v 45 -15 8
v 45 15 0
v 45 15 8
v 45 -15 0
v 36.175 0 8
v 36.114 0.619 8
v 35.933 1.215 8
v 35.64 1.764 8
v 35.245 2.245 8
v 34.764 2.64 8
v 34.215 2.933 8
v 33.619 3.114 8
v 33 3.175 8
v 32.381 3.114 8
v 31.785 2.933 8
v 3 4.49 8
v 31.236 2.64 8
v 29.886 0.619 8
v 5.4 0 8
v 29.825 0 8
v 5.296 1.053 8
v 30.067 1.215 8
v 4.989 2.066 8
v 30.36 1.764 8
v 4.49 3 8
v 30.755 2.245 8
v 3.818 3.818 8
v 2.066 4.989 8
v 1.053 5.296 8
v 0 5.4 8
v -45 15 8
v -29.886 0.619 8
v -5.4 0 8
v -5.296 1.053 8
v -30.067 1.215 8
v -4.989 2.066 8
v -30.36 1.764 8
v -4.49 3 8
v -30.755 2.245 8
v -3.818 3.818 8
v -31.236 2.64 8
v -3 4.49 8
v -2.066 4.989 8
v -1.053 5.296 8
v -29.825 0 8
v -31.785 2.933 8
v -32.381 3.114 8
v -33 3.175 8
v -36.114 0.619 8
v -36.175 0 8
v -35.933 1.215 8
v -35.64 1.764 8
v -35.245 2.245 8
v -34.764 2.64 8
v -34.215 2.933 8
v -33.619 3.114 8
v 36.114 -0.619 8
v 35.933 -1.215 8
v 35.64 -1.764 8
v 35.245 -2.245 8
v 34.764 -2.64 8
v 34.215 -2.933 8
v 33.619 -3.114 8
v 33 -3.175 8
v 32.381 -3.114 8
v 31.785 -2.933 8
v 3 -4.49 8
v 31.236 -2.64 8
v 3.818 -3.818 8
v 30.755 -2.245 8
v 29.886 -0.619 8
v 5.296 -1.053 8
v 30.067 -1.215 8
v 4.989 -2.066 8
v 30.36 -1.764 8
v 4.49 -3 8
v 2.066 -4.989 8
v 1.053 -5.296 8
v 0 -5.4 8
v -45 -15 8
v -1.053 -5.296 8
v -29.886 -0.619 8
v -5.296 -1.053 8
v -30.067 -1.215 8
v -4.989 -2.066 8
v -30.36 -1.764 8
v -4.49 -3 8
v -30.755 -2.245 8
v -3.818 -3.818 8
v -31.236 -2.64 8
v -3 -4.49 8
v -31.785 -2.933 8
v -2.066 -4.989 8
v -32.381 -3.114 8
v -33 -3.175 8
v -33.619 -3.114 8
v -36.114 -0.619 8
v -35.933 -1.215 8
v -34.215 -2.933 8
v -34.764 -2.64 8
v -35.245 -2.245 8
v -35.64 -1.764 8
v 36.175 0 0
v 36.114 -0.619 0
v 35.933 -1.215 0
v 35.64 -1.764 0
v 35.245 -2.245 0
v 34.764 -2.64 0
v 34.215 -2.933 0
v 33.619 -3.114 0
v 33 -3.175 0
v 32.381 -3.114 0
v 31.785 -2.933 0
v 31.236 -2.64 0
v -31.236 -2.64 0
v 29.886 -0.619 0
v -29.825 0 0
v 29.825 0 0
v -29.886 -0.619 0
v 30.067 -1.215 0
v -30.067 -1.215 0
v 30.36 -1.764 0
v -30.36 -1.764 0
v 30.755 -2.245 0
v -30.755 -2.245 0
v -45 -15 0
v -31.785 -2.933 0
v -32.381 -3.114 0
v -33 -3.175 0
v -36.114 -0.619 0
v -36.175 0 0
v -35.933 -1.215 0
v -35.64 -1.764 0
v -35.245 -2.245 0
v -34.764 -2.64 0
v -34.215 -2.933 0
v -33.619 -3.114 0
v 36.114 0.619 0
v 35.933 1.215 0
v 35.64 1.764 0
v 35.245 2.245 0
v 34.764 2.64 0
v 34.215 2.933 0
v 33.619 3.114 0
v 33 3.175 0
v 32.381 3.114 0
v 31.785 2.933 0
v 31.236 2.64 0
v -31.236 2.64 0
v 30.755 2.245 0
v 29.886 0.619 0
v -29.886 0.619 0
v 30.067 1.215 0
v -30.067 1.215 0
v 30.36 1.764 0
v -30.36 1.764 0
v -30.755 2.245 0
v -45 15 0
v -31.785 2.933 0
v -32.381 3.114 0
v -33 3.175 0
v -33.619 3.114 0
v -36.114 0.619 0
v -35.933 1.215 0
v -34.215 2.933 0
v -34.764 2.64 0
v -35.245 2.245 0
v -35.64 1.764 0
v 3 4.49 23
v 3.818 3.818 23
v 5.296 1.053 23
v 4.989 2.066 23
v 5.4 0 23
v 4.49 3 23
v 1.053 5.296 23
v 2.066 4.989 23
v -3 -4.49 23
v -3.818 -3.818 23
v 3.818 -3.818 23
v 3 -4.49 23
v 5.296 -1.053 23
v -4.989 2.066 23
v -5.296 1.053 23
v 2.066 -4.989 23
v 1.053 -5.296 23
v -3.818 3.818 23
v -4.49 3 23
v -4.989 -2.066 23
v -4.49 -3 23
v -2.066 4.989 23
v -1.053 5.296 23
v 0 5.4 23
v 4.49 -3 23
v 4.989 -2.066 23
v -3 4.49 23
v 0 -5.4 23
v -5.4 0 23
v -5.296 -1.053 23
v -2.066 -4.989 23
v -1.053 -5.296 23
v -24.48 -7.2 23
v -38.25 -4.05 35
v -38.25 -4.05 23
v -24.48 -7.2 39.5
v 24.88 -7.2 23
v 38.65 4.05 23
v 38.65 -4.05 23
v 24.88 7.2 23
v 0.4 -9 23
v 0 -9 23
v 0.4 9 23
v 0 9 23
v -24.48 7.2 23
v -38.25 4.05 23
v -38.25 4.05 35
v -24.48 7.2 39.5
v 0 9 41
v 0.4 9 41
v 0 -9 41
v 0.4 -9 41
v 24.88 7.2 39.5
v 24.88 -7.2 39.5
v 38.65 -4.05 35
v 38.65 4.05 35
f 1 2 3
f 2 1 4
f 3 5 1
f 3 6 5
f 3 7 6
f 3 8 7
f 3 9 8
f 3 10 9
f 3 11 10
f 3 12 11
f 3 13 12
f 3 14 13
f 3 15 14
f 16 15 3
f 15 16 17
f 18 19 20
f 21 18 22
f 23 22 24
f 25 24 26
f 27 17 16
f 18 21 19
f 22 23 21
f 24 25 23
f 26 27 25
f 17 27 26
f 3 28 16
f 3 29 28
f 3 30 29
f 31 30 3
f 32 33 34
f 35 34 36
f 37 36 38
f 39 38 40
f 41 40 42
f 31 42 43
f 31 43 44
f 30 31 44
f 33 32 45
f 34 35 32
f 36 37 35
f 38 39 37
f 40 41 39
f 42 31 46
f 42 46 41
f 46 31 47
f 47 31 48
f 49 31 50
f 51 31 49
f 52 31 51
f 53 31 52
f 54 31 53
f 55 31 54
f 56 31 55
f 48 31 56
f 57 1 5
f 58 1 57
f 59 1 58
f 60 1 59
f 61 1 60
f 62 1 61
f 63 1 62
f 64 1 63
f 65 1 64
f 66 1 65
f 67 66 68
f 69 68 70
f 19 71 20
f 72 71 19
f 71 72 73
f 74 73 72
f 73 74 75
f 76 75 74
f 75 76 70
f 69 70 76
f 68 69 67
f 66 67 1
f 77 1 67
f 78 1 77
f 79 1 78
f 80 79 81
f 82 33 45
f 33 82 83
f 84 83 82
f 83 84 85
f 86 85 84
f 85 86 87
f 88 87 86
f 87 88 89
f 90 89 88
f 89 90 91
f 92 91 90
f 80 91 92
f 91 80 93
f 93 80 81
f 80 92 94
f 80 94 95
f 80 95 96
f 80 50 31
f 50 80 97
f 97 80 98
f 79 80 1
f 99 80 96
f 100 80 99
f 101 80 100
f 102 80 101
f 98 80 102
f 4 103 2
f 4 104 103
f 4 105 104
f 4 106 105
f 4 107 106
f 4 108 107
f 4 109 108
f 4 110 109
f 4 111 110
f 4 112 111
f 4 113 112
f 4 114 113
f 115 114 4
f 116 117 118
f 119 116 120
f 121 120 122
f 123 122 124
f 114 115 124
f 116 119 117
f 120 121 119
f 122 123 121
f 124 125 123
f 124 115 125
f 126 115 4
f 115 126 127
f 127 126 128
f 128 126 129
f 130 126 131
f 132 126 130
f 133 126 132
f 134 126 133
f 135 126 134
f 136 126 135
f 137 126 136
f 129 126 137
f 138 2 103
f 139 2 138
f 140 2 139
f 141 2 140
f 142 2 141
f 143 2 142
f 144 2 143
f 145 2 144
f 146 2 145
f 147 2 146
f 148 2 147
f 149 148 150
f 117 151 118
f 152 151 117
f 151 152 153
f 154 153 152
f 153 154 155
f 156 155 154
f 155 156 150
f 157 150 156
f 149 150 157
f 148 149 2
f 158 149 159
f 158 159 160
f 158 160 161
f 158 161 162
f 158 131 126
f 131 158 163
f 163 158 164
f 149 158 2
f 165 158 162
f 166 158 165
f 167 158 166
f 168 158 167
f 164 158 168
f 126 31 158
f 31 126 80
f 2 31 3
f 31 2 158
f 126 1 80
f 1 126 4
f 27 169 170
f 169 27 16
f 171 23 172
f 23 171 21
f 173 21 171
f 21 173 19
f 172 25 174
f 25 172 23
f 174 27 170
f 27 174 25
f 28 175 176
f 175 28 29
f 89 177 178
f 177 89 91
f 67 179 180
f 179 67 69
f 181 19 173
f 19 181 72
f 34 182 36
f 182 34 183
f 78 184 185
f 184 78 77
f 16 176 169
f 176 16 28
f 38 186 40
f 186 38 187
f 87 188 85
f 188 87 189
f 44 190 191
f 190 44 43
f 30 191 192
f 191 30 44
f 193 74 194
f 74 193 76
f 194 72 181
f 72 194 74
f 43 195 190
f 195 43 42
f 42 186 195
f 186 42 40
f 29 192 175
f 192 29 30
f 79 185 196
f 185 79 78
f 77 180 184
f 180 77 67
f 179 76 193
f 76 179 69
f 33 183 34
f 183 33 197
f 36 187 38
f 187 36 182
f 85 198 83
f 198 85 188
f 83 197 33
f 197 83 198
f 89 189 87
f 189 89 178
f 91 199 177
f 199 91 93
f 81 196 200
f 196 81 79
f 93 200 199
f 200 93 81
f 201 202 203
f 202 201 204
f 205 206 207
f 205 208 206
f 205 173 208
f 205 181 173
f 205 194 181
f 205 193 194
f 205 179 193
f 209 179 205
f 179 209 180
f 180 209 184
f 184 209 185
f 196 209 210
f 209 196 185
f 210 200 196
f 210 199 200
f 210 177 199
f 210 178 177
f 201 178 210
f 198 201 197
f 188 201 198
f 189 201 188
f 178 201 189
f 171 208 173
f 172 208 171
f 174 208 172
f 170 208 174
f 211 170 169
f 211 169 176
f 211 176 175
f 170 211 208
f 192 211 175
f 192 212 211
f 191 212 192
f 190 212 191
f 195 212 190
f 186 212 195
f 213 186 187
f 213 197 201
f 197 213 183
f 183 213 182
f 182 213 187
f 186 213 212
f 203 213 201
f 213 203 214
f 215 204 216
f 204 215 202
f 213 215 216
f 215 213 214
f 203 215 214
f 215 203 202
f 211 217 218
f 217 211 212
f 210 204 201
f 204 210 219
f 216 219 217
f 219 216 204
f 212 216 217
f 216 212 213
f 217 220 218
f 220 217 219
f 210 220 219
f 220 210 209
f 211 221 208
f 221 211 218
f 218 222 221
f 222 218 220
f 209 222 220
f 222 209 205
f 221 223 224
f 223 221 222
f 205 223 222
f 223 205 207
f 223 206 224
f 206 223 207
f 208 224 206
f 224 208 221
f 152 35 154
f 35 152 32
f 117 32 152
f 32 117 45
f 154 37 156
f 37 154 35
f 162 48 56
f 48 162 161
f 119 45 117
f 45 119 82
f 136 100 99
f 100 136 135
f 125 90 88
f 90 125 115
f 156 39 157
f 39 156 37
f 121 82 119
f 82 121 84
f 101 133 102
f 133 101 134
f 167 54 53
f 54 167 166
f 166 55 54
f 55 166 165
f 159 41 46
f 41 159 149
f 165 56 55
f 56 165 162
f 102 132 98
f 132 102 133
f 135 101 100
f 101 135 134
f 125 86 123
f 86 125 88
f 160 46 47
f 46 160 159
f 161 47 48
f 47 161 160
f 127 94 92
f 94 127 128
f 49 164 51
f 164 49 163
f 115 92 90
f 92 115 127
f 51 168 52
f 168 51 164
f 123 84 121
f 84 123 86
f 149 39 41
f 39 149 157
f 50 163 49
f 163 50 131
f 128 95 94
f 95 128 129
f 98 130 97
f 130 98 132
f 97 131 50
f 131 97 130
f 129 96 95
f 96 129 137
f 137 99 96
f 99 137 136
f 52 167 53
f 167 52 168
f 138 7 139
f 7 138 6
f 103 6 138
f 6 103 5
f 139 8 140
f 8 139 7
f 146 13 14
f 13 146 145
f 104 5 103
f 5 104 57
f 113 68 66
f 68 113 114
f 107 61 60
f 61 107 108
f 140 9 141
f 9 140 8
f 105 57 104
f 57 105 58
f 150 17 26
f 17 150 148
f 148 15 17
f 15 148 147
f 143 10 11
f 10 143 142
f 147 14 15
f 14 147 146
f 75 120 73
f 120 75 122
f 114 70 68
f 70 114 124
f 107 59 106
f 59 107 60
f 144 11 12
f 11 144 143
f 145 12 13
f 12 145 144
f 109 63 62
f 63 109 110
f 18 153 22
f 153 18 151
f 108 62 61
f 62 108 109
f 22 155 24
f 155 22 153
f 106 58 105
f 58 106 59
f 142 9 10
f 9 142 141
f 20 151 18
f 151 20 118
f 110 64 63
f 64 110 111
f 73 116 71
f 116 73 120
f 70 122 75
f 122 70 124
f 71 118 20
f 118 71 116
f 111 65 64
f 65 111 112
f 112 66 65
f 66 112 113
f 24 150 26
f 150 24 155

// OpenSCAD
$fn = 32;

// ----------------------------------------------------------------------
// Boat cleat: 90 mm base, horn 32 mm up
// ----------------------------------------------------------------------

// --- parameters (mm) ---
base_l = 90;              // base length
base_w = 30;              // base width
base_t = 8;               // base thickness
horn_len = 76.5;          // horn length
horn_d = 18;              // horn diameter at the middle
horn_z = 32;              // horn axis height
end_drop = 6;             // how far the horn tips drop
post_d = 10.8;            // centre post diameter
holes_d = 6.35;           // fixing holes
hole_x = 33;              // fixing hole spacing

difference() {
  union() {
    translate([-45, -15, 0]) cube([base_l, base_w, base_t]);
    /* centre post, sunk 1 mm into the base */
    translate([0, 0, 7]) cylinder(h = 25, d = post_d);
    /* horn: a hull chain of boxes, full in the middle and lighter at the tips */
    hull() {
      translate([-38.25, -4.05, 23]) cube([0.4, 8.1, 12], center = false);
      translate([-24.48, -7.2, 23]) cube([0.4, 14.4, 16.5], center = false);
    }
    hull() {
      translate([-24.48, -7.2, 23]) cube([0.4, 14.4, 16.5], center = false);
      translate([0, -9, 23]) cube([0.4, 18, 18], center = false);
    }
    hull() {
      translate([0, -9, 23]) cube([0.4, 18, 18], center = false);
      translate([24.48, -7.2, 23]) cube([0.4, 14.4, 16.5], center = false);
    }
    hull() {
      translate([24.48, -7.2, 23]) cube([0.4, 14.4, 16.5], center = false);
      translate([38.25, -4.05, 23]) cube([0.4, 8.1, 12], center = false);
    }
  }
  translate([-33, 0, -2.5]) cylinder(h = base_t + 5, d = holes_d);
  translate([33, 0, -2.5]) cylinder(h = base_t + 5, d = holes_d);
}
